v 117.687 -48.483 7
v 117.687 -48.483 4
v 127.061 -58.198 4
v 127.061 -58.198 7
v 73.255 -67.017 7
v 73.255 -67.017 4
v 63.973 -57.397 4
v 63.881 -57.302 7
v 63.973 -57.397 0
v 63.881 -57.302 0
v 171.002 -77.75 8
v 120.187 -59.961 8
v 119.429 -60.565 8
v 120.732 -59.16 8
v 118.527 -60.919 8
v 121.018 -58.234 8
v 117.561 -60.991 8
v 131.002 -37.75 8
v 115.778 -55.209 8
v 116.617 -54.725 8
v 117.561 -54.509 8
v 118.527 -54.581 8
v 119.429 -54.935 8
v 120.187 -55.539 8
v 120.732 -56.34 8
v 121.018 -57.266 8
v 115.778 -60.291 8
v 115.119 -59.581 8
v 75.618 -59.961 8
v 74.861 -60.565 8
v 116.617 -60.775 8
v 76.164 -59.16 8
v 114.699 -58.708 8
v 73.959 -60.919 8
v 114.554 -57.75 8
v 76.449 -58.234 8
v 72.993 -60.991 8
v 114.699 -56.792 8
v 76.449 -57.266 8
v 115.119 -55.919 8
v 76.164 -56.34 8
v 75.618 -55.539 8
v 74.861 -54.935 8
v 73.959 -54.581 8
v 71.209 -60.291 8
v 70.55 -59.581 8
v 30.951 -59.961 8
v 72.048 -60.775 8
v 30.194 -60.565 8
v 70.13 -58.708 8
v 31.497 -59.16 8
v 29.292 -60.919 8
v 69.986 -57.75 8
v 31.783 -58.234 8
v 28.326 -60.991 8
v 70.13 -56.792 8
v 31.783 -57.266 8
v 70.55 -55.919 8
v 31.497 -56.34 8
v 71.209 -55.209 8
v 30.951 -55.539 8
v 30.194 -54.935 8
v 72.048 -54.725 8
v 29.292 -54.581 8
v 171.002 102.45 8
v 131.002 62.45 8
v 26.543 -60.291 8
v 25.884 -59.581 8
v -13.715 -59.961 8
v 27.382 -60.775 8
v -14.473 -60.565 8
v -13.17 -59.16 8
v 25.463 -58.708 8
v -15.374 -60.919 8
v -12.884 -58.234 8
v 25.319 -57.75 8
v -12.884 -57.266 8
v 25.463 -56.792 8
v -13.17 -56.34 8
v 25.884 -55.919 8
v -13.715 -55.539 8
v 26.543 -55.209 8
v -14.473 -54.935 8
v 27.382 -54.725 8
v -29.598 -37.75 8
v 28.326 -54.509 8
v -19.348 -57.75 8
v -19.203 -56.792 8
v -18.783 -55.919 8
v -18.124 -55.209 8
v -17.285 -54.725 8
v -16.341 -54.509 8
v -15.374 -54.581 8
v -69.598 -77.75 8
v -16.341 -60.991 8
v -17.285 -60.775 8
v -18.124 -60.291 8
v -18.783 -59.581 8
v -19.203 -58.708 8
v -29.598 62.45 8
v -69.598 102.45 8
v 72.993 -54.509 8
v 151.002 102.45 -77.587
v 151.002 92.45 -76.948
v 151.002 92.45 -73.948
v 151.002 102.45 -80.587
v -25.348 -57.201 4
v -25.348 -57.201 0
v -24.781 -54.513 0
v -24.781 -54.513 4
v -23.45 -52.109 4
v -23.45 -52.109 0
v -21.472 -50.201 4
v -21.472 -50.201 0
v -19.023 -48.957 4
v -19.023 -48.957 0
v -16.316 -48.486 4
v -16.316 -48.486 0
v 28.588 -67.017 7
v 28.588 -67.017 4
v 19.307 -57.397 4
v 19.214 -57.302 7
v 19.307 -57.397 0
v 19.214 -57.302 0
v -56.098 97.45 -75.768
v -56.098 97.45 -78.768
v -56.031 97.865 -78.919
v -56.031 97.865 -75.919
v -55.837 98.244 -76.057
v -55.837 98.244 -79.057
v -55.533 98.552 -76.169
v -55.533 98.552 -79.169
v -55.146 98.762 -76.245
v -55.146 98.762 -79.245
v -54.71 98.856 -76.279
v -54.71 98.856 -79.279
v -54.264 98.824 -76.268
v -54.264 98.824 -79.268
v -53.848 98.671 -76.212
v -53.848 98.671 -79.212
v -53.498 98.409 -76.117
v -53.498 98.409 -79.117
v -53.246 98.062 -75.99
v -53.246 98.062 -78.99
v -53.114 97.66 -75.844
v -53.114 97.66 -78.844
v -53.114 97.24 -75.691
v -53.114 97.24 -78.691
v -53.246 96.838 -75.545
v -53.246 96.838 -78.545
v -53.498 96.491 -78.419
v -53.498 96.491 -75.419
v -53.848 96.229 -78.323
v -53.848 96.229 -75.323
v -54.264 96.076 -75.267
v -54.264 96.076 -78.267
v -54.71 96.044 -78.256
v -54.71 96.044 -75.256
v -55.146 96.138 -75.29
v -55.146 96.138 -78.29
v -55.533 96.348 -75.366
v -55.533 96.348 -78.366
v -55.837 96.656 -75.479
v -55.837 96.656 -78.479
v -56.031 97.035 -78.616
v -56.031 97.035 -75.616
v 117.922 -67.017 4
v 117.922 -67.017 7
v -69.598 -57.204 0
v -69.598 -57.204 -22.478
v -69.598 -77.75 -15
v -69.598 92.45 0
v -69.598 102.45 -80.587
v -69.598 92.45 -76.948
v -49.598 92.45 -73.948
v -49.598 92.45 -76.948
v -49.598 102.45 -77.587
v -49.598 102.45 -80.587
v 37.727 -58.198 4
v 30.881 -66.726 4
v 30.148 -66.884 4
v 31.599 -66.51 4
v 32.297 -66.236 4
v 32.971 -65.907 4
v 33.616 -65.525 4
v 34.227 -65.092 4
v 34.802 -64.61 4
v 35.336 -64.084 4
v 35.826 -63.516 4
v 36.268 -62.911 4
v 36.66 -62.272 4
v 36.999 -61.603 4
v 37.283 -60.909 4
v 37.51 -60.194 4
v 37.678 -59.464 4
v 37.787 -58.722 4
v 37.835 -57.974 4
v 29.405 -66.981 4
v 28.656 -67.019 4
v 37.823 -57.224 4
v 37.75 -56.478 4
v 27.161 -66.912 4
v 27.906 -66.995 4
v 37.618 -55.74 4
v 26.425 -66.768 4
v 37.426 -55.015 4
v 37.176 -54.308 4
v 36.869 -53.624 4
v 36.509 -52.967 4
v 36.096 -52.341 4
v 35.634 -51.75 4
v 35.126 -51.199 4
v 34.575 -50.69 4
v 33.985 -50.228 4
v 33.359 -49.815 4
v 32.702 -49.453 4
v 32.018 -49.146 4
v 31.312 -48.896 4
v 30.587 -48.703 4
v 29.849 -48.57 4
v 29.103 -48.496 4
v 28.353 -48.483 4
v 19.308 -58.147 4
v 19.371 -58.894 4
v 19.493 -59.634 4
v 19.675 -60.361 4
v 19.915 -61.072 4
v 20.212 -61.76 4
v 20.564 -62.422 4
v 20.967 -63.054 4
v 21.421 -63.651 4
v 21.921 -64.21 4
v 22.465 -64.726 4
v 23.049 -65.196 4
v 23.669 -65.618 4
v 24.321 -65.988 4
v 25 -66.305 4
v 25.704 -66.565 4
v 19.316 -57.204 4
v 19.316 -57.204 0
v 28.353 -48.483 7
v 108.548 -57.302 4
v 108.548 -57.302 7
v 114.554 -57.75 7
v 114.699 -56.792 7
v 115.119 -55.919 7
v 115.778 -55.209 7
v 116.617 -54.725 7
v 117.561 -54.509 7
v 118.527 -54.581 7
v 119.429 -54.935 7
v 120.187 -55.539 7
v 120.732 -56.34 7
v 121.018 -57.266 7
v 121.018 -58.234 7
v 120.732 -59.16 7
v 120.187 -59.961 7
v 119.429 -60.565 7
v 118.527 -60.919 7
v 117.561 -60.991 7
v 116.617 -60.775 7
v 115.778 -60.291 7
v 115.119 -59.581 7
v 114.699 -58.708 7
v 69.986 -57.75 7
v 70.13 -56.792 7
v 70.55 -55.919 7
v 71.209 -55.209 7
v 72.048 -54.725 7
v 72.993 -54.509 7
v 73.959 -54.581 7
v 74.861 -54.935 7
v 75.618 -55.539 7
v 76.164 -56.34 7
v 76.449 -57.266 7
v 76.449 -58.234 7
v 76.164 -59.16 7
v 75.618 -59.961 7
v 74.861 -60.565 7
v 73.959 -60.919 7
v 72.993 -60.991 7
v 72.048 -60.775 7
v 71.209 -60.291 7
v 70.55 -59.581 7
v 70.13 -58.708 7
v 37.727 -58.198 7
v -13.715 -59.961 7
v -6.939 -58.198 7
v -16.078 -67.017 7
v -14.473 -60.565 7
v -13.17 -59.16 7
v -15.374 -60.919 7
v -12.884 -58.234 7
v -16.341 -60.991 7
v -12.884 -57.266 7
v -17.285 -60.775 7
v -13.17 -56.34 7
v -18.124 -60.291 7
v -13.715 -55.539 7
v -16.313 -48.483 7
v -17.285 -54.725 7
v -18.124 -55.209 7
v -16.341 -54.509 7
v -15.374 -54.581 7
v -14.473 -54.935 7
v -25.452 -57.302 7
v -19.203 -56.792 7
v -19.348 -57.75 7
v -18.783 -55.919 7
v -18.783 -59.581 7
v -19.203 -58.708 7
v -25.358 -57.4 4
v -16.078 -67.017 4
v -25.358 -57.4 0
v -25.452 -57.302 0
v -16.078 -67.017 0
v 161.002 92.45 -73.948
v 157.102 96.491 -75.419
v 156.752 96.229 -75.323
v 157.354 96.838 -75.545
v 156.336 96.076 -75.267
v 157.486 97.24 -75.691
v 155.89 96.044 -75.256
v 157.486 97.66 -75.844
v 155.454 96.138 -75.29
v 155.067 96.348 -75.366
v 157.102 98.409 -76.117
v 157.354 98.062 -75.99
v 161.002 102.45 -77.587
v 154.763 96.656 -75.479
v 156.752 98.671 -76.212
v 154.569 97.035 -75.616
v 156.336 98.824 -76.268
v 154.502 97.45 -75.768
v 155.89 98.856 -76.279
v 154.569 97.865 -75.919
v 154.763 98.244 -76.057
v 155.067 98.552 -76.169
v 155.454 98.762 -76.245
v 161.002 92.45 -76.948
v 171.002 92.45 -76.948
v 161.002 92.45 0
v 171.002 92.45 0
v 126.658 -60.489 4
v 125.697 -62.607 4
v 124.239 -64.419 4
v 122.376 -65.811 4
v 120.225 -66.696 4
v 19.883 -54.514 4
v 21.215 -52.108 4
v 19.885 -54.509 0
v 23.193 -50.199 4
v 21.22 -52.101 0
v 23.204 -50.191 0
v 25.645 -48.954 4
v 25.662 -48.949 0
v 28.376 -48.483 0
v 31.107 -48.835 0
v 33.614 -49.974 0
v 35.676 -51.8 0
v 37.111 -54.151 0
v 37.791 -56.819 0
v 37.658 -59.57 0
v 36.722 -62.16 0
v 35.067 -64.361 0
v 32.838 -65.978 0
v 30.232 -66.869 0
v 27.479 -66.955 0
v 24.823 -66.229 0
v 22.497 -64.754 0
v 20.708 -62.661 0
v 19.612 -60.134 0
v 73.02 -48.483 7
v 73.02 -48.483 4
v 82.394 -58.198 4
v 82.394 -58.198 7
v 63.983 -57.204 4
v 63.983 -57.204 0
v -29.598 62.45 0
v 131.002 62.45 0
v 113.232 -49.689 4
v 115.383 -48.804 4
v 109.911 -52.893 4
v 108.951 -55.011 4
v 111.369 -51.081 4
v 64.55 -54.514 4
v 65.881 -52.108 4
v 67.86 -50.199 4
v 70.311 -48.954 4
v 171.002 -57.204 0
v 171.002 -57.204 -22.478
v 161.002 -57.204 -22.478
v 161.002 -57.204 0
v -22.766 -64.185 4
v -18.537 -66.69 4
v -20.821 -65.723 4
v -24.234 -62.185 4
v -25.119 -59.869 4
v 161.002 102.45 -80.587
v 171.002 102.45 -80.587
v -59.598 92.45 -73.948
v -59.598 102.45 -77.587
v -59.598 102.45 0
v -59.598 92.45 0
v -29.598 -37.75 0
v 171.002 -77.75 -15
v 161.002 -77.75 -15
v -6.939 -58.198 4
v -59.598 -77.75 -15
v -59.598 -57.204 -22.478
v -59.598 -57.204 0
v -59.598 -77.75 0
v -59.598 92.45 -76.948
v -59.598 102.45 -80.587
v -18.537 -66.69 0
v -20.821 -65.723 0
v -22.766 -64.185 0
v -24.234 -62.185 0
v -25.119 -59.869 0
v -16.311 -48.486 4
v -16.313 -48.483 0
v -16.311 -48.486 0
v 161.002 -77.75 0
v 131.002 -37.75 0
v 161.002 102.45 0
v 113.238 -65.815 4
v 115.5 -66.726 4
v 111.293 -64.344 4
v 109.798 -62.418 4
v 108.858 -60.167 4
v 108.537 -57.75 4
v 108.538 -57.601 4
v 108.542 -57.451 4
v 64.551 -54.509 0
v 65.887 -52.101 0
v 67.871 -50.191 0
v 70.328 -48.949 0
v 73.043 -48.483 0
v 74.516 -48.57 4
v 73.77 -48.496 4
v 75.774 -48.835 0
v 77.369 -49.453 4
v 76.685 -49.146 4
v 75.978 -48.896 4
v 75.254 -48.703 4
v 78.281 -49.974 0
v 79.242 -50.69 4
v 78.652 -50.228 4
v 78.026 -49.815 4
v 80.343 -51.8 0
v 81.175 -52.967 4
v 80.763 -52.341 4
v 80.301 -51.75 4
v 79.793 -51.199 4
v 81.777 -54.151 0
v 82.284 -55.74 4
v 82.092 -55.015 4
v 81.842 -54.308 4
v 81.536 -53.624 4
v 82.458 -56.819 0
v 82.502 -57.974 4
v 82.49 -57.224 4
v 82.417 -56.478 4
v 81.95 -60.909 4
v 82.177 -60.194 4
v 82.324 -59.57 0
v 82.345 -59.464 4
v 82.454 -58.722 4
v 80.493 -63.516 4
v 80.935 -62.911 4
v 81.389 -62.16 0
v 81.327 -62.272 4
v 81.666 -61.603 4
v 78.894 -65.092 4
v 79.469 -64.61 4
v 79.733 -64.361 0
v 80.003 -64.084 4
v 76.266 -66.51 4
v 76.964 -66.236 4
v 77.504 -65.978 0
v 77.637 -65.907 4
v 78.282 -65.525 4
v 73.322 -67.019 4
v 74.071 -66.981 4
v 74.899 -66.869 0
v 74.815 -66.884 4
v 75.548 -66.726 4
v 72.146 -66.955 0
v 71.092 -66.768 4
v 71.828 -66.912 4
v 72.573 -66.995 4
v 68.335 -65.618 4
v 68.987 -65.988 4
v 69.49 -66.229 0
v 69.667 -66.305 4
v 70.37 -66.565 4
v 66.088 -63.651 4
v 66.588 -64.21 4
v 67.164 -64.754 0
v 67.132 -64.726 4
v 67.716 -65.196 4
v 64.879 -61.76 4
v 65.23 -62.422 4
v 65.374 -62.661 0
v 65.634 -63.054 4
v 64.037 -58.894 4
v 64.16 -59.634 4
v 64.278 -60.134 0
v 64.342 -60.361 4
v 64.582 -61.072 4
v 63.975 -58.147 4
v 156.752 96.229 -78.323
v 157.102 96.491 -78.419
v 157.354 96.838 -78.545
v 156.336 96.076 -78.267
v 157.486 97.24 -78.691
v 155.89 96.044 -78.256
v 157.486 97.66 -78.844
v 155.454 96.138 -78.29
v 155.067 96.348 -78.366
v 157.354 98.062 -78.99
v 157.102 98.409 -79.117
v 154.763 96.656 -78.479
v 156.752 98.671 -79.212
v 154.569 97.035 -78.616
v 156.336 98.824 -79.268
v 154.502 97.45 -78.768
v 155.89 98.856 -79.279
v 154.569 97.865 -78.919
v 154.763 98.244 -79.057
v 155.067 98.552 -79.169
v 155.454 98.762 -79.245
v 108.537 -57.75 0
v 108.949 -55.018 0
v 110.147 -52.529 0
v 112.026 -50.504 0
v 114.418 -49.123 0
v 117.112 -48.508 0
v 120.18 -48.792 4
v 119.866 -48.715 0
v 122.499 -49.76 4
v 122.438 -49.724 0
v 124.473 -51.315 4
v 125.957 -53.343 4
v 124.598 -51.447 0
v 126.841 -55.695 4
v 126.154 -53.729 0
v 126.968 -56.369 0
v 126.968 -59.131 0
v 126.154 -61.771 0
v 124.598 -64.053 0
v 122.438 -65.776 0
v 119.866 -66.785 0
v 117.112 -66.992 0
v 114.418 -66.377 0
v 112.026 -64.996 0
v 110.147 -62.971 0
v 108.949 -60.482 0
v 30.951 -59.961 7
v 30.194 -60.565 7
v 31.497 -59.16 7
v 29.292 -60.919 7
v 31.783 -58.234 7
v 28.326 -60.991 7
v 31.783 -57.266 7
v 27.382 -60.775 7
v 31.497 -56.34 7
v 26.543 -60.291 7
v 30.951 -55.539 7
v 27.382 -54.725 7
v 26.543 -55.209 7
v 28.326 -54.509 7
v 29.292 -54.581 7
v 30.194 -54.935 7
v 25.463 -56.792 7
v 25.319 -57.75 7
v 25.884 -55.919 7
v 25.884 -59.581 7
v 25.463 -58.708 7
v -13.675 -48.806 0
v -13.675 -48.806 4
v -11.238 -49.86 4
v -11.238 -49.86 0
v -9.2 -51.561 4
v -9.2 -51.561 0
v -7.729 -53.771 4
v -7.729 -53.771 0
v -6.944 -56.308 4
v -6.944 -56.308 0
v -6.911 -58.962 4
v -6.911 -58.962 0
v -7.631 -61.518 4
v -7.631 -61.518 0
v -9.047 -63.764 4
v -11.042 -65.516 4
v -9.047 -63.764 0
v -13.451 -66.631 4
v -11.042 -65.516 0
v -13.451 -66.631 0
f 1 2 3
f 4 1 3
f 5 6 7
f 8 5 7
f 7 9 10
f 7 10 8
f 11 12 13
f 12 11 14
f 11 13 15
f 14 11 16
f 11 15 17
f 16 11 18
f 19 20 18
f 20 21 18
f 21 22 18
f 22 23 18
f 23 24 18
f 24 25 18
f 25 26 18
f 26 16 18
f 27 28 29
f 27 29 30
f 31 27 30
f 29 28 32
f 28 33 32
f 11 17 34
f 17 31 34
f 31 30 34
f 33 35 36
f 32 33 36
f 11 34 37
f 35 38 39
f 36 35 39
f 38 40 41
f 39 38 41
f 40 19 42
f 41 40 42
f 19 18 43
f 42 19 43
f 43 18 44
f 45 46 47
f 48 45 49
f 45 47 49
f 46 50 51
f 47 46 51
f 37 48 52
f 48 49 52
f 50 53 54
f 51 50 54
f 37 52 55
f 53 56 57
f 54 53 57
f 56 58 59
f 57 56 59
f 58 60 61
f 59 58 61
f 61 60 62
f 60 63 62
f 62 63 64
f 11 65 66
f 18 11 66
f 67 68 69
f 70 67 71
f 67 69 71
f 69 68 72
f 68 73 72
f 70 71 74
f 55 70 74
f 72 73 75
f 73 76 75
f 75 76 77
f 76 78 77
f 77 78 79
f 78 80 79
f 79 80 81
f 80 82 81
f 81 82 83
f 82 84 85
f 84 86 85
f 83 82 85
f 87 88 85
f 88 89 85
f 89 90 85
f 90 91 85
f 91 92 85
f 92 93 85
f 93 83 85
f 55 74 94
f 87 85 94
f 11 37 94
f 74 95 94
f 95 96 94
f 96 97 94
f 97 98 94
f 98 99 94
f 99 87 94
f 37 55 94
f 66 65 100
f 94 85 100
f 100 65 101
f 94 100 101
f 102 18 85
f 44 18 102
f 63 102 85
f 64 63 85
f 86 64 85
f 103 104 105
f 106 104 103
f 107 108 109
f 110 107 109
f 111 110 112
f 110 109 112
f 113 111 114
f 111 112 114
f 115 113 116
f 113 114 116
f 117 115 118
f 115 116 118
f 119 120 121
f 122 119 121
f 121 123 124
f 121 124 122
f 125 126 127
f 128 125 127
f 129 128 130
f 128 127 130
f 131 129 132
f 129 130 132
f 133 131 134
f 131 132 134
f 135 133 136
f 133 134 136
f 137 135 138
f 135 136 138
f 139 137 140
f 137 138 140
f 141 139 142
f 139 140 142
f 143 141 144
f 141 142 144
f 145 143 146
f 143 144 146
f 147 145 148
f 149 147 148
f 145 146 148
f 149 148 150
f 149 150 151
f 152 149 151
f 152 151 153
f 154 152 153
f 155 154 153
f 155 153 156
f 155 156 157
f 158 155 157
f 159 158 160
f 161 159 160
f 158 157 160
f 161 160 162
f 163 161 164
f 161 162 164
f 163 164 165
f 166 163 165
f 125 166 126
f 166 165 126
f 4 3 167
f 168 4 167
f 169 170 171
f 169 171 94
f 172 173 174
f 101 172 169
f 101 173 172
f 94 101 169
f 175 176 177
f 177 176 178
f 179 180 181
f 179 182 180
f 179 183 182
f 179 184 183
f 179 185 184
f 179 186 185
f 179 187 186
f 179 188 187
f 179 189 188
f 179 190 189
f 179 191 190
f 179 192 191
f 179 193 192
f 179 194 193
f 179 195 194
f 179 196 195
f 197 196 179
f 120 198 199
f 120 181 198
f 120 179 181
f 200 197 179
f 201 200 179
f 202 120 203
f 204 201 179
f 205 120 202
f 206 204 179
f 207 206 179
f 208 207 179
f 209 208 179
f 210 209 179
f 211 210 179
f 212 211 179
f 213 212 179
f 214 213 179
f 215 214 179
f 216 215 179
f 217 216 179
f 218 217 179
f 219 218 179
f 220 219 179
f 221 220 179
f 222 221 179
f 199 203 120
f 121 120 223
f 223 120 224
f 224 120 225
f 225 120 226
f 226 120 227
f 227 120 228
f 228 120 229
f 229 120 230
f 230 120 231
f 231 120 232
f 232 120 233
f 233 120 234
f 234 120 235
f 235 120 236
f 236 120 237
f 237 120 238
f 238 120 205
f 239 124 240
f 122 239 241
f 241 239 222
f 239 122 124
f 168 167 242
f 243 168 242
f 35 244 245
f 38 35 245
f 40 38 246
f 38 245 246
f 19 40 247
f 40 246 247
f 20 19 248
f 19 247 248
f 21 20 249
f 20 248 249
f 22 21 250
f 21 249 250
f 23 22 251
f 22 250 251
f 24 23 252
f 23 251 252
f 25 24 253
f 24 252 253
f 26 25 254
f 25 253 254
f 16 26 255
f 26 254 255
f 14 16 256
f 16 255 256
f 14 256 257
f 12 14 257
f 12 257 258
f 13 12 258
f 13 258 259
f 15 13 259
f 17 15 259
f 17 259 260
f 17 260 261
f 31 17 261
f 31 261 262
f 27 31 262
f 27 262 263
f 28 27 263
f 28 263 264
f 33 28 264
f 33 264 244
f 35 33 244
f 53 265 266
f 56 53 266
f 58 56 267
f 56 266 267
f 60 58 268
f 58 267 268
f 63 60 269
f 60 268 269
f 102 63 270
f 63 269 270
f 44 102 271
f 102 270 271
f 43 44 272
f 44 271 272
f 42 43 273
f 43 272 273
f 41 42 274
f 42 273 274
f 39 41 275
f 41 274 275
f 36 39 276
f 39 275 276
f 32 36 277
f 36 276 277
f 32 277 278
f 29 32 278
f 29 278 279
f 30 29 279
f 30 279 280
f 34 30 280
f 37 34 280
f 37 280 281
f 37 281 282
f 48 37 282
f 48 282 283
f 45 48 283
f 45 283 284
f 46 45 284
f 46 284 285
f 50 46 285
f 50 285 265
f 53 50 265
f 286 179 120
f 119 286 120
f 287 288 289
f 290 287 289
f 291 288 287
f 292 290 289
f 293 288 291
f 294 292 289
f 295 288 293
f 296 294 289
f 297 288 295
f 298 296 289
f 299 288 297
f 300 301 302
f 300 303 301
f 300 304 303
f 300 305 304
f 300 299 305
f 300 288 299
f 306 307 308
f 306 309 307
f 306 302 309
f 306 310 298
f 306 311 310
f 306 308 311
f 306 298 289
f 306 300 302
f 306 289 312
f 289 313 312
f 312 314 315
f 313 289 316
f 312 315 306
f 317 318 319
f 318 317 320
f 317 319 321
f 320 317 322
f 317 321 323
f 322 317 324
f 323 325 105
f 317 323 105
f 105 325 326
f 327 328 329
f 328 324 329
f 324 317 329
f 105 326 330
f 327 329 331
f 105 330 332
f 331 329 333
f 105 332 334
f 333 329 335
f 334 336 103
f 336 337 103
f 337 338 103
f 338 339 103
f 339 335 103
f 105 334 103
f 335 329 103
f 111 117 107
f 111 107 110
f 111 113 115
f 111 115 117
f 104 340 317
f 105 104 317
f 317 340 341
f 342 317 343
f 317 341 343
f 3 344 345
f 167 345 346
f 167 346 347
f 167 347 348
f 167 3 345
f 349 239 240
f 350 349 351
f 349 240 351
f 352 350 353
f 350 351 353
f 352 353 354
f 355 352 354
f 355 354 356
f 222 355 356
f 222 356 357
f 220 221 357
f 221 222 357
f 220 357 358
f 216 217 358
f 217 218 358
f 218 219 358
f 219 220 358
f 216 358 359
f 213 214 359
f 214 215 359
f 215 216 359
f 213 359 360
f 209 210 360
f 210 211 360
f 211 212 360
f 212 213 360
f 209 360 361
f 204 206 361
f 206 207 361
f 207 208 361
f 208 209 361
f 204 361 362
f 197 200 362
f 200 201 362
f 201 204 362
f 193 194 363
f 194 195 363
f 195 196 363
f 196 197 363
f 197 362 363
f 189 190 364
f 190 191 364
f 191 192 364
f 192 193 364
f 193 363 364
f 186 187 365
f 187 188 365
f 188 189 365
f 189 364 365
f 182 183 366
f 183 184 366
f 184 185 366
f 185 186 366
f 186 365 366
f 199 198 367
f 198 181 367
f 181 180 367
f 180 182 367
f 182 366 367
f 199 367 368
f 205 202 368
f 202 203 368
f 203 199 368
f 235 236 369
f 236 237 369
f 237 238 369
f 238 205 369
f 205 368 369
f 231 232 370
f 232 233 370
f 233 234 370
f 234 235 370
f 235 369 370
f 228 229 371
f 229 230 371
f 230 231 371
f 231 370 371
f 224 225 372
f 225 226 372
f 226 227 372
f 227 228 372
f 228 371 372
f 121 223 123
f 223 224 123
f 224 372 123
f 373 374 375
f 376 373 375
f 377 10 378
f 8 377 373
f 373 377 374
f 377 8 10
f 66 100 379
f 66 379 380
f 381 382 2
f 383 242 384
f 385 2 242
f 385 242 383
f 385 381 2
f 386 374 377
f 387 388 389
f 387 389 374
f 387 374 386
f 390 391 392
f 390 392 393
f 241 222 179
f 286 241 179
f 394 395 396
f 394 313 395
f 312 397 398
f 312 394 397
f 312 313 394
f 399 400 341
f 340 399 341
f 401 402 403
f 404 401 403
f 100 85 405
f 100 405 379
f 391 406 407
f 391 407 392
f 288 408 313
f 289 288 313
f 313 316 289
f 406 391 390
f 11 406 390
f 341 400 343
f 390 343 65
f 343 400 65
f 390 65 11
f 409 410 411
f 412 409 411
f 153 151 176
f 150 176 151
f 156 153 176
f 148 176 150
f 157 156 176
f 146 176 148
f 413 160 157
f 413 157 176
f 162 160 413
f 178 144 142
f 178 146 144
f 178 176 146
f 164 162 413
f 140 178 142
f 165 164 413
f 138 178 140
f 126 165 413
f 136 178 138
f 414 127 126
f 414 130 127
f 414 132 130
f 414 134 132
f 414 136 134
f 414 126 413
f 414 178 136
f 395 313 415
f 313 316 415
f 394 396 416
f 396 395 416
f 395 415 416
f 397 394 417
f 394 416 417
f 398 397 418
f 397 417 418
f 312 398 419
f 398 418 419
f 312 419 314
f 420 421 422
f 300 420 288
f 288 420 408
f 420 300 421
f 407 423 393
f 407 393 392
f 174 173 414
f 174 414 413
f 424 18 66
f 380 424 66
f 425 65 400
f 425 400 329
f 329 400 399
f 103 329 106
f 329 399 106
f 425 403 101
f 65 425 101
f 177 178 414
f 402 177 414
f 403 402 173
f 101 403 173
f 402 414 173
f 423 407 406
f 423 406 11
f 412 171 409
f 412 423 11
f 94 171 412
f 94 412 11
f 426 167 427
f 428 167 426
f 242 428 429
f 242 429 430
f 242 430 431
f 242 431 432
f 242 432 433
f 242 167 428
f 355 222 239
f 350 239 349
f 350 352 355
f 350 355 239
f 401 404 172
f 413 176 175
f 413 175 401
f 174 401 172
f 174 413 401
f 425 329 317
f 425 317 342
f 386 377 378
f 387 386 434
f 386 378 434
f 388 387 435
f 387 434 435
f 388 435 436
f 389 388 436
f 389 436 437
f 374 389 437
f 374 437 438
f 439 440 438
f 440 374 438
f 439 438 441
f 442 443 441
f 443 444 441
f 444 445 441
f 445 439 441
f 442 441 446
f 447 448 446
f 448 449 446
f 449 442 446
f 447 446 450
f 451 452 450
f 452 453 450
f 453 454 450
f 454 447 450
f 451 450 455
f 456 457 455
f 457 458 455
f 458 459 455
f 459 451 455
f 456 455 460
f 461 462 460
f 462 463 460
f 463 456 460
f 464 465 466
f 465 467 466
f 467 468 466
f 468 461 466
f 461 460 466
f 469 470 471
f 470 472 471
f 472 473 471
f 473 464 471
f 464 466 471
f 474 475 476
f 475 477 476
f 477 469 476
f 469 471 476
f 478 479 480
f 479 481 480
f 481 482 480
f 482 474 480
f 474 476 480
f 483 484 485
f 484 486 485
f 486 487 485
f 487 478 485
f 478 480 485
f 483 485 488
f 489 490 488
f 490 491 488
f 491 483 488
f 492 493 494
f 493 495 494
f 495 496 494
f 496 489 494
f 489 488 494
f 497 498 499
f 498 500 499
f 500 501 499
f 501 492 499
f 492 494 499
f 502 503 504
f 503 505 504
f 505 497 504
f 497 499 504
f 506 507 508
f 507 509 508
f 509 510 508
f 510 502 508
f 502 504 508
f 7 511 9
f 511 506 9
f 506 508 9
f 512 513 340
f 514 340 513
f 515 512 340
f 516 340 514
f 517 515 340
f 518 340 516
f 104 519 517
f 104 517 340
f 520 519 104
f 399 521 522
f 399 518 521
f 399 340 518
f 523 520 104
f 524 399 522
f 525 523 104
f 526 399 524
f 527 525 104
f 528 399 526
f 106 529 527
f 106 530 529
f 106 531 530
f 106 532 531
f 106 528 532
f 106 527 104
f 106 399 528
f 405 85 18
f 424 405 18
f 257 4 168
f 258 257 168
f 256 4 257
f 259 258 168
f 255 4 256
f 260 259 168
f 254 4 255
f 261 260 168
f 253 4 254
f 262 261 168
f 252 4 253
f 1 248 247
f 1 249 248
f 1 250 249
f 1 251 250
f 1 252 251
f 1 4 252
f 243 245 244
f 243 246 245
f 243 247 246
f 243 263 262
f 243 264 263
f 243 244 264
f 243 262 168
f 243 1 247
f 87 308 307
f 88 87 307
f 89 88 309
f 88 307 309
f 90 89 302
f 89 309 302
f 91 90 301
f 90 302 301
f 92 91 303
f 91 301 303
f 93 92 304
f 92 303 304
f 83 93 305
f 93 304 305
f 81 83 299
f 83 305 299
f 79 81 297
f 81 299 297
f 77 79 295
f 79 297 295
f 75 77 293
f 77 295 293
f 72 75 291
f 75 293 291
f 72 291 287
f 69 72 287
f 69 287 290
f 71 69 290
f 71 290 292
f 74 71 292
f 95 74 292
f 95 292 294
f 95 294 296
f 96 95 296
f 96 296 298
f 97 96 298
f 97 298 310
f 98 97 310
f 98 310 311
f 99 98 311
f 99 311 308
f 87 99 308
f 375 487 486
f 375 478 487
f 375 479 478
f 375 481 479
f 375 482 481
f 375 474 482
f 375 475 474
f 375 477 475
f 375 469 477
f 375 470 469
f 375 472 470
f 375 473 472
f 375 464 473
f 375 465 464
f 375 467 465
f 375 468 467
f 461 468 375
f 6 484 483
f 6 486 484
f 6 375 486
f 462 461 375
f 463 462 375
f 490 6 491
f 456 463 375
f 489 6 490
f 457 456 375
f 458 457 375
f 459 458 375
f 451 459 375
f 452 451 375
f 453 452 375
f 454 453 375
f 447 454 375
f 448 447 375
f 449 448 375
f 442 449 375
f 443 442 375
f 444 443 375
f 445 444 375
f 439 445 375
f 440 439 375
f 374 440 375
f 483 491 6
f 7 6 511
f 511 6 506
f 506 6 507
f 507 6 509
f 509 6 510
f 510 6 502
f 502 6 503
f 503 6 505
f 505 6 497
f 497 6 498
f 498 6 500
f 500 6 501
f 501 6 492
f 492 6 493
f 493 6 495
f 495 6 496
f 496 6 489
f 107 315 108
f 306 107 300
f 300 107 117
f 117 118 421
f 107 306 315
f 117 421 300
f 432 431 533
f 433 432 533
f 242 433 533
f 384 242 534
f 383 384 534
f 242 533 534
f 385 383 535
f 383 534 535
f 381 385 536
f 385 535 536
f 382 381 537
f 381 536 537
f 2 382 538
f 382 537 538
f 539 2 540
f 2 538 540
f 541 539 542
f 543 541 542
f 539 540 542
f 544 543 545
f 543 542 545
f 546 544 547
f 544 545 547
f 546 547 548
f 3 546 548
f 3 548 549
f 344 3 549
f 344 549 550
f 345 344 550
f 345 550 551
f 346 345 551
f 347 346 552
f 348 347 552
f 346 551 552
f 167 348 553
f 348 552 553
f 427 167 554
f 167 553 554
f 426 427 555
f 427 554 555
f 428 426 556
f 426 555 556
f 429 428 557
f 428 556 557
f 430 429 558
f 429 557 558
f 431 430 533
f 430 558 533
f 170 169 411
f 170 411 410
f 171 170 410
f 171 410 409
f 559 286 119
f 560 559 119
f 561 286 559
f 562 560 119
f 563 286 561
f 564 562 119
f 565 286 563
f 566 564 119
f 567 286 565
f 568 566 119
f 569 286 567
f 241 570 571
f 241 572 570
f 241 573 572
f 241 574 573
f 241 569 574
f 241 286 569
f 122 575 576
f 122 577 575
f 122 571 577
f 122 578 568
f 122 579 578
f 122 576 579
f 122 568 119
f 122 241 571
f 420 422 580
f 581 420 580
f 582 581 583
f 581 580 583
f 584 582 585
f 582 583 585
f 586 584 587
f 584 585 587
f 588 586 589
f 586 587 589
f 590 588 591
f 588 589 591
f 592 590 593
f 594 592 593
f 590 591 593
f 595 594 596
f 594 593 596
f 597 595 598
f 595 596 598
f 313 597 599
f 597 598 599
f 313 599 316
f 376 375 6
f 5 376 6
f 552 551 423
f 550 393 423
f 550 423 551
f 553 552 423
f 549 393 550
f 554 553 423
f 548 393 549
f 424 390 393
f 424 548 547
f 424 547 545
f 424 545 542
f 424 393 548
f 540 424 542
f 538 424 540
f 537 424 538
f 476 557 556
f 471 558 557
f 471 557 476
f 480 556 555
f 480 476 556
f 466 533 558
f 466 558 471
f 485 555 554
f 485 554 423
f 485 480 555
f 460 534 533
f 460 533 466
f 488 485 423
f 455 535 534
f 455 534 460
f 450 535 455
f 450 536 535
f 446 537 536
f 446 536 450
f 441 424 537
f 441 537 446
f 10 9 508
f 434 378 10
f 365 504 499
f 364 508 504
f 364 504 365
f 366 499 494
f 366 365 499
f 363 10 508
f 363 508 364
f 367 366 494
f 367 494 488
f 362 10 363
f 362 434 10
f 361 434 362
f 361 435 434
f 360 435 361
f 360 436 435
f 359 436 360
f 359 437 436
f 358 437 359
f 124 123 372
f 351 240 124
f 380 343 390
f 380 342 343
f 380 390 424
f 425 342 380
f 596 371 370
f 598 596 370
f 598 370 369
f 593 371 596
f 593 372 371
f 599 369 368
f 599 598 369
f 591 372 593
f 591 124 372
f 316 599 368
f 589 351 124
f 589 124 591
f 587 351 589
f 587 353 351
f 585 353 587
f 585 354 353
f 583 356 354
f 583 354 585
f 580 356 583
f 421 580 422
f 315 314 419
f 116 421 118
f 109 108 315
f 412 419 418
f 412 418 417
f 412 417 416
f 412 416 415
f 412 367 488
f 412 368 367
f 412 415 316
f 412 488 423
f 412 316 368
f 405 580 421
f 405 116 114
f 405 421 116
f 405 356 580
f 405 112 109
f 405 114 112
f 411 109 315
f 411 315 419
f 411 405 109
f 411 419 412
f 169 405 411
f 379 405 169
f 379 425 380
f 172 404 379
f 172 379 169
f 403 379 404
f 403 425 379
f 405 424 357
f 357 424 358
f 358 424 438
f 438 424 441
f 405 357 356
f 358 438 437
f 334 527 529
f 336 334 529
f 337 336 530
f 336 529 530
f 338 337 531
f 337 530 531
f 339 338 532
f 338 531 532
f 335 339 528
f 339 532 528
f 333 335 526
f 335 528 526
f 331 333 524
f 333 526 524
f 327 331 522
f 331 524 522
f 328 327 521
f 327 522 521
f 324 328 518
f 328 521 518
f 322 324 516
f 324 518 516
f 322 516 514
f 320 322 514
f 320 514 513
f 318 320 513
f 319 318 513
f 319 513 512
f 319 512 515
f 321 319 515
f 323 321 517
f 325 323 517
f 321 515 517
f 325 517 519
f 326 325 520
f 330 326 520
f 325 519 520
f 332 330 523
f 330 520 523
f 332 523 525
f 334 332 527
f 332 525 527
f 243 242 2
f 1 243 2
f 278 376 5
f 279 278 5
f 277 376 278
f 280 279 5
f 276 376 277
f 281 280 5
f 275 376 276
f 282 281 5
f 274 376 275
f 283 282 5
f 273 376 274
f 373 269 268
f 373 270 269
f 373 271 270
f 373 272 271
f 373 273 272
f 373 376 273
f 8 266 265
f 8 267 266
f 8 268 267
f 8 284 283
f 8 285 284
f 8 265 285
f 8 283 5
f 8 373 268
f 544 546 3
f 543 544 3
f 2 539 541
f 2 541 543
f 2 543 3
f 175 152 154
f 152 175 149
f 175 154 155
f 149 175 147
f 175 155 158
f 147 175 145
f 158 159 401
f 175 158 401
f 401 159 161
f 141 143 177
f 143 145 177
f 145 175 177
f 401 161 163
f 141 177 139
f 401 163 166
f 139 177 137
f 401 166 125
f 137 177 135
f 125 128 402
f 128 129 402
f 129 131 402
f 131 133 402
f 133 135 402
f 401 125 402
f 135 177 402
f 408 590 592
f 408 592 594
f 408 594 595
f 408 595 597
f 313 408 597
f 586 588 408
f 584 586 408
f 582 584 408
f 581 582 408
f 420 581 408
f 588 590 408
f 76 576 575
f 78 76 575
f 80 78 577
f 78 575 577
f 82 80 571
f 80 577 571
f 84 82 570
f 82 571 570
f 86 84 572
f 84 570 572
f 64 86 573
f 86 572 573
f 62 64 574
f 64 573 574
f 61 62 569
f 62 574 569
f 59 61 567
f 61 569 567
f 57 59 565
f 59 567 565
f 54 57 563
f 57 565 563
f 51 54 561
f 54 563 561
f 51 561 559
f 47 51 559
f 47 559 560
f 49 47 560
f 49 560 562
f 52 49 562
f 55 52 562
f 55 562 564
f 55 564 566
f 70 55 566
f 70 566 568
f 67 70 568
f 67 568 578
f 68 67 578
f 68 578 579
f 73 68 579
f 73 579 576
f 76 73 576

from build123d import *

# Parameters (mm, degrees)
SKETCH1_W                      = 240.6
SKETCH1_H                      = 180.2
BOSS_EXTRUDE1_DEPTH            = 8
SKETCH2_W                      = 160.6
SKETCH2_H                      = 100.2
CUT_EXTRUDE1_DEPTH             = 200.503872501
CUT_EXTRUDE2_DEPTH             = 7
CUT_EXTRUDE3_DEPTH             = 7
CUT_EXTRUDE4_DEPTH             = 7
CUT_EXTRUDE5_DEPTH             = 7
F_6_5_6_5_DIAMETER_HOLE1_D     = 6.5
F_6_5_6_5_DIAMETER_HOLE1_DEPTH = 8
SKETCH9_R                      = 9.267416037
SKETCH9_R_2                    = 9.269178346
SKETCH9_R_3                    = 9.266671768
CUT_EXTRUDE7_DEPTH             = 4
BOSS_EXTRUDE2_DEPTH            = 10
BOSS_EXTRUDE3_DEPTH            = 10
BOSS_EXTRUDE4_DEPTH            = 10
BOSS_EXTRUDE5_DEPTH            = 10
SKETCH18_W                     = 10
SKETCH18_H                     = 10.641777725
SKETCH18_R                     = 1.5
BOSS_EXTRUDE6_DEPTH            = 3


with BuildPart() as part:
    # Sketch1 → Boss-Extrude1 (new body)
    with BuildSketch(Plane(origin=(0, 0, 0), x_dir=(-1, 0, 0), z_dir=(0, 0, -1))):
        with Locations((-50.702318109, 12.34999924)):
            Rectangle(SKETCH1_W, SKETCH1_H)
    extrude(amount=-BOSS_EXTRUDE1_DEPTH)

    # Sketch2 → Cut-Extrude1 (cut, through all)
    with BuildSketch(Plane.XY.offset(8)):
        with Locations((50.702318109, 12.34999924)):
            Rectangle(SKETCH2_W, SKETCH2_H)
    extrude(amount=-CUT_EXTRUDE1_DEPTH, mode=Mode.SUBTRACT)

    # Sketch3 → Cut-Extrude2 (cut)
    with BuildSketch(Plane(origin=(0, 0, 0), x_dir=(-1, 0, 0), z_dir=(0, 0, -1))):
        Polygon((-117.686768689, -48.483328992), (-127.060792146, -58.198146757), (-117.921667286, -67.016672528), (-108.547643828, -57.301854763), align=None)
    extrude(amount=-CUT_EXTRUDE2_DEPTH, mode=Mode.SUBTRACT)

    # Sketch4 → Cut-Extrude3 (cut)
    with BuildSketch(Plane(origin=(0, 0, 0), x_dir=(-1, 0, 0), z_dir=(0, 0, -1))):
        Polygon((6.939207854, -58.198146757), (16.078332714, -67.016672528), (25.452356172, -57.301854763), (16.313231311, -48.483328992), align=None)
    extrude(amount=-CUT_EXTRUDE3_DEPTH, mode=Mode.SUBTRACT)

    # Sketch5 → Cut-Extrude4 (cut)
    with BuildSketch(Plane(origin=(0, 0, 0), x_dir=(-1, 0, 0), z_dir=(0, 0, -1))):
        Polygon((-37.727458813, -58.198146757), (-28.588333952, -67.016672528), (-19.214310494, -57.301854763), (-28.353435355, -48.483328992), align=None)
    extrude(amount=-CUT_EXTRUDE4_DEPTH, mode=Mode.SUBTRACT)

    # Sketch6 → Cut-Extrude5 (cut)
    with BuildSketch(Plane(origin=(0, 0, 0), x_dir=(-1, 0, 0), z_dir=(0, 0, -1))):
        Polygon((-82.39412548, -58.198146757), (-73.255000619, -67.016672528), (-63.880977161, -57.301854763), (-73.020102022, -48.483328992), align=None)
    extrude(amount=-CUT_EXTRUDE5_DEPTH, mode=Mode.SUBTRACT)

    # Ø6.5 (6.5) Diameter Hole1
    with Locations(Plane.XY.offset(8)):
        with Locations((117.804217987, -57.75000076), (-16.097681891, -57.75000076), (28.568984776, -57.75000076), (73.235651442, -57.75000076)):
            Hole(F_6_5_6_5_DIAMETER_HOLE1_D / 2, depth=F_6_5_6_5_DIAMETER_HOLE1_DEPTH)

    # Sketch9 → Cut-Extrude7 (cut)
    with BuildSketch(Plane(origin=(0, 0, 0), x_dir=(-1, 0, 0), z_dir=(0, 0, -1))):
        with Locations((-117.804217987, -57.75000076)):
            Circle(SKETCH9_R)
        with Locations((-73.235651442, -57.75000076)):
            Circle(SKETCH9_R_2)
        with Locations((-28.568984776, -57.75000076)):
            Circle(SKETCH9_R_2)
        with Locations((16.097681891, -57.75000076)):
            Circle(SKETCH9_R_3)
    extrude(amount=-CUT_EXTRUDE7_DEPTH, mode=Mode.SUBTRACT)

    # Sketch12 → Boss-Extrude2 (add)
    with BuildSketch(Plane(origin=(171.002318109, 0, 0), x_dir=(0, 0, -1), z_dir=(1, 0, 0))):
        Polygon((0, -77.75000076), (15, -77.75000076), (22.478199259, -57.203817156), (0, -57.203817156), align=None)
    extrude(amount=-BOSS_EXTRUDE2_DEPTH)

    # Sketch14 → Boss-Extrude3 (add)
    with BuildSketch(Plane.ZY.offset(69.597681891)):
        Polygon((-22.478199259, -57.203817156), (-15, -77.75000076), (0, -77.75000076), (0, -57.203817156), align=None)
    extrude(amount=-BOSS_EXTRUDE3_DEPTH)

    # Sketch15 → Boss-Extrude4 (add)
    with BuildSketch(Plane.ZY.offset(69.597681891)):
        Polygon((0, 102.44999924), (-80.587436215, 102.44999924), (-76.947733872, 92.44999924), (0, 92.44999924), align=None)
    extrude(amount=-BOSS_EXTRUDE4_DEPTH)

    # Sketch16 → Boss-Extrude5 (add)
    with BuildSketch(Plane(origin=(171.002318109, 0, 0), x_dir=(0, 0, -1), z_dir=(1, 0, 0))):
        Polygon((0, 102.44999924), (80.587436215, 102.44999924), (76.947733872, 92.44999924), (0, 92.44999924), align=None)
    extrude(amount=-BOSS_EXTRUDE5_DEPTH)

    # Sketch18 → Boss-Extrude6 (add, along a direction that is not the sketch's normal)
    # profile 1 of 2: a face of its own
    with BuildSketch(Plane(origin=(0, -13.915929435, -38.233701894), x_dir=(-1, 0, 0), z_dir=(0, -0.3420201433256657, -0.9396926207859096))):
        with Locations((54.597681891, 118.513145908)):
            Rectangle(SKETCH18_W, SKETCH18_H)
        with Locations((54.597681891, 118.513145907)):
            Circle(SKETCH18_R, mode=Mode.SUBTRACT)
    # profile 2 of 2: a face of its own
    with BuildSketch(Plane(origin=(0, -13.915929435, -38.233701894), x_dir=(-1, 0, 0), z_dir=(0, -0.3420201433256657, -0.9396926207859096))):
        with Locations((-156.002318109, 118.513145908)):
            Rectangle(SKETCH18_W, SKETCH18_H)
        with Locations((-156.002318109, 118.513145907)):
            Circle(SKETCH18_R, mode=Mode.SUBTRACT)
    extrude(amount=-BOSS_EXTRUDE6_DEPTH, dir=(0, 0, -1))


solid = part.part
